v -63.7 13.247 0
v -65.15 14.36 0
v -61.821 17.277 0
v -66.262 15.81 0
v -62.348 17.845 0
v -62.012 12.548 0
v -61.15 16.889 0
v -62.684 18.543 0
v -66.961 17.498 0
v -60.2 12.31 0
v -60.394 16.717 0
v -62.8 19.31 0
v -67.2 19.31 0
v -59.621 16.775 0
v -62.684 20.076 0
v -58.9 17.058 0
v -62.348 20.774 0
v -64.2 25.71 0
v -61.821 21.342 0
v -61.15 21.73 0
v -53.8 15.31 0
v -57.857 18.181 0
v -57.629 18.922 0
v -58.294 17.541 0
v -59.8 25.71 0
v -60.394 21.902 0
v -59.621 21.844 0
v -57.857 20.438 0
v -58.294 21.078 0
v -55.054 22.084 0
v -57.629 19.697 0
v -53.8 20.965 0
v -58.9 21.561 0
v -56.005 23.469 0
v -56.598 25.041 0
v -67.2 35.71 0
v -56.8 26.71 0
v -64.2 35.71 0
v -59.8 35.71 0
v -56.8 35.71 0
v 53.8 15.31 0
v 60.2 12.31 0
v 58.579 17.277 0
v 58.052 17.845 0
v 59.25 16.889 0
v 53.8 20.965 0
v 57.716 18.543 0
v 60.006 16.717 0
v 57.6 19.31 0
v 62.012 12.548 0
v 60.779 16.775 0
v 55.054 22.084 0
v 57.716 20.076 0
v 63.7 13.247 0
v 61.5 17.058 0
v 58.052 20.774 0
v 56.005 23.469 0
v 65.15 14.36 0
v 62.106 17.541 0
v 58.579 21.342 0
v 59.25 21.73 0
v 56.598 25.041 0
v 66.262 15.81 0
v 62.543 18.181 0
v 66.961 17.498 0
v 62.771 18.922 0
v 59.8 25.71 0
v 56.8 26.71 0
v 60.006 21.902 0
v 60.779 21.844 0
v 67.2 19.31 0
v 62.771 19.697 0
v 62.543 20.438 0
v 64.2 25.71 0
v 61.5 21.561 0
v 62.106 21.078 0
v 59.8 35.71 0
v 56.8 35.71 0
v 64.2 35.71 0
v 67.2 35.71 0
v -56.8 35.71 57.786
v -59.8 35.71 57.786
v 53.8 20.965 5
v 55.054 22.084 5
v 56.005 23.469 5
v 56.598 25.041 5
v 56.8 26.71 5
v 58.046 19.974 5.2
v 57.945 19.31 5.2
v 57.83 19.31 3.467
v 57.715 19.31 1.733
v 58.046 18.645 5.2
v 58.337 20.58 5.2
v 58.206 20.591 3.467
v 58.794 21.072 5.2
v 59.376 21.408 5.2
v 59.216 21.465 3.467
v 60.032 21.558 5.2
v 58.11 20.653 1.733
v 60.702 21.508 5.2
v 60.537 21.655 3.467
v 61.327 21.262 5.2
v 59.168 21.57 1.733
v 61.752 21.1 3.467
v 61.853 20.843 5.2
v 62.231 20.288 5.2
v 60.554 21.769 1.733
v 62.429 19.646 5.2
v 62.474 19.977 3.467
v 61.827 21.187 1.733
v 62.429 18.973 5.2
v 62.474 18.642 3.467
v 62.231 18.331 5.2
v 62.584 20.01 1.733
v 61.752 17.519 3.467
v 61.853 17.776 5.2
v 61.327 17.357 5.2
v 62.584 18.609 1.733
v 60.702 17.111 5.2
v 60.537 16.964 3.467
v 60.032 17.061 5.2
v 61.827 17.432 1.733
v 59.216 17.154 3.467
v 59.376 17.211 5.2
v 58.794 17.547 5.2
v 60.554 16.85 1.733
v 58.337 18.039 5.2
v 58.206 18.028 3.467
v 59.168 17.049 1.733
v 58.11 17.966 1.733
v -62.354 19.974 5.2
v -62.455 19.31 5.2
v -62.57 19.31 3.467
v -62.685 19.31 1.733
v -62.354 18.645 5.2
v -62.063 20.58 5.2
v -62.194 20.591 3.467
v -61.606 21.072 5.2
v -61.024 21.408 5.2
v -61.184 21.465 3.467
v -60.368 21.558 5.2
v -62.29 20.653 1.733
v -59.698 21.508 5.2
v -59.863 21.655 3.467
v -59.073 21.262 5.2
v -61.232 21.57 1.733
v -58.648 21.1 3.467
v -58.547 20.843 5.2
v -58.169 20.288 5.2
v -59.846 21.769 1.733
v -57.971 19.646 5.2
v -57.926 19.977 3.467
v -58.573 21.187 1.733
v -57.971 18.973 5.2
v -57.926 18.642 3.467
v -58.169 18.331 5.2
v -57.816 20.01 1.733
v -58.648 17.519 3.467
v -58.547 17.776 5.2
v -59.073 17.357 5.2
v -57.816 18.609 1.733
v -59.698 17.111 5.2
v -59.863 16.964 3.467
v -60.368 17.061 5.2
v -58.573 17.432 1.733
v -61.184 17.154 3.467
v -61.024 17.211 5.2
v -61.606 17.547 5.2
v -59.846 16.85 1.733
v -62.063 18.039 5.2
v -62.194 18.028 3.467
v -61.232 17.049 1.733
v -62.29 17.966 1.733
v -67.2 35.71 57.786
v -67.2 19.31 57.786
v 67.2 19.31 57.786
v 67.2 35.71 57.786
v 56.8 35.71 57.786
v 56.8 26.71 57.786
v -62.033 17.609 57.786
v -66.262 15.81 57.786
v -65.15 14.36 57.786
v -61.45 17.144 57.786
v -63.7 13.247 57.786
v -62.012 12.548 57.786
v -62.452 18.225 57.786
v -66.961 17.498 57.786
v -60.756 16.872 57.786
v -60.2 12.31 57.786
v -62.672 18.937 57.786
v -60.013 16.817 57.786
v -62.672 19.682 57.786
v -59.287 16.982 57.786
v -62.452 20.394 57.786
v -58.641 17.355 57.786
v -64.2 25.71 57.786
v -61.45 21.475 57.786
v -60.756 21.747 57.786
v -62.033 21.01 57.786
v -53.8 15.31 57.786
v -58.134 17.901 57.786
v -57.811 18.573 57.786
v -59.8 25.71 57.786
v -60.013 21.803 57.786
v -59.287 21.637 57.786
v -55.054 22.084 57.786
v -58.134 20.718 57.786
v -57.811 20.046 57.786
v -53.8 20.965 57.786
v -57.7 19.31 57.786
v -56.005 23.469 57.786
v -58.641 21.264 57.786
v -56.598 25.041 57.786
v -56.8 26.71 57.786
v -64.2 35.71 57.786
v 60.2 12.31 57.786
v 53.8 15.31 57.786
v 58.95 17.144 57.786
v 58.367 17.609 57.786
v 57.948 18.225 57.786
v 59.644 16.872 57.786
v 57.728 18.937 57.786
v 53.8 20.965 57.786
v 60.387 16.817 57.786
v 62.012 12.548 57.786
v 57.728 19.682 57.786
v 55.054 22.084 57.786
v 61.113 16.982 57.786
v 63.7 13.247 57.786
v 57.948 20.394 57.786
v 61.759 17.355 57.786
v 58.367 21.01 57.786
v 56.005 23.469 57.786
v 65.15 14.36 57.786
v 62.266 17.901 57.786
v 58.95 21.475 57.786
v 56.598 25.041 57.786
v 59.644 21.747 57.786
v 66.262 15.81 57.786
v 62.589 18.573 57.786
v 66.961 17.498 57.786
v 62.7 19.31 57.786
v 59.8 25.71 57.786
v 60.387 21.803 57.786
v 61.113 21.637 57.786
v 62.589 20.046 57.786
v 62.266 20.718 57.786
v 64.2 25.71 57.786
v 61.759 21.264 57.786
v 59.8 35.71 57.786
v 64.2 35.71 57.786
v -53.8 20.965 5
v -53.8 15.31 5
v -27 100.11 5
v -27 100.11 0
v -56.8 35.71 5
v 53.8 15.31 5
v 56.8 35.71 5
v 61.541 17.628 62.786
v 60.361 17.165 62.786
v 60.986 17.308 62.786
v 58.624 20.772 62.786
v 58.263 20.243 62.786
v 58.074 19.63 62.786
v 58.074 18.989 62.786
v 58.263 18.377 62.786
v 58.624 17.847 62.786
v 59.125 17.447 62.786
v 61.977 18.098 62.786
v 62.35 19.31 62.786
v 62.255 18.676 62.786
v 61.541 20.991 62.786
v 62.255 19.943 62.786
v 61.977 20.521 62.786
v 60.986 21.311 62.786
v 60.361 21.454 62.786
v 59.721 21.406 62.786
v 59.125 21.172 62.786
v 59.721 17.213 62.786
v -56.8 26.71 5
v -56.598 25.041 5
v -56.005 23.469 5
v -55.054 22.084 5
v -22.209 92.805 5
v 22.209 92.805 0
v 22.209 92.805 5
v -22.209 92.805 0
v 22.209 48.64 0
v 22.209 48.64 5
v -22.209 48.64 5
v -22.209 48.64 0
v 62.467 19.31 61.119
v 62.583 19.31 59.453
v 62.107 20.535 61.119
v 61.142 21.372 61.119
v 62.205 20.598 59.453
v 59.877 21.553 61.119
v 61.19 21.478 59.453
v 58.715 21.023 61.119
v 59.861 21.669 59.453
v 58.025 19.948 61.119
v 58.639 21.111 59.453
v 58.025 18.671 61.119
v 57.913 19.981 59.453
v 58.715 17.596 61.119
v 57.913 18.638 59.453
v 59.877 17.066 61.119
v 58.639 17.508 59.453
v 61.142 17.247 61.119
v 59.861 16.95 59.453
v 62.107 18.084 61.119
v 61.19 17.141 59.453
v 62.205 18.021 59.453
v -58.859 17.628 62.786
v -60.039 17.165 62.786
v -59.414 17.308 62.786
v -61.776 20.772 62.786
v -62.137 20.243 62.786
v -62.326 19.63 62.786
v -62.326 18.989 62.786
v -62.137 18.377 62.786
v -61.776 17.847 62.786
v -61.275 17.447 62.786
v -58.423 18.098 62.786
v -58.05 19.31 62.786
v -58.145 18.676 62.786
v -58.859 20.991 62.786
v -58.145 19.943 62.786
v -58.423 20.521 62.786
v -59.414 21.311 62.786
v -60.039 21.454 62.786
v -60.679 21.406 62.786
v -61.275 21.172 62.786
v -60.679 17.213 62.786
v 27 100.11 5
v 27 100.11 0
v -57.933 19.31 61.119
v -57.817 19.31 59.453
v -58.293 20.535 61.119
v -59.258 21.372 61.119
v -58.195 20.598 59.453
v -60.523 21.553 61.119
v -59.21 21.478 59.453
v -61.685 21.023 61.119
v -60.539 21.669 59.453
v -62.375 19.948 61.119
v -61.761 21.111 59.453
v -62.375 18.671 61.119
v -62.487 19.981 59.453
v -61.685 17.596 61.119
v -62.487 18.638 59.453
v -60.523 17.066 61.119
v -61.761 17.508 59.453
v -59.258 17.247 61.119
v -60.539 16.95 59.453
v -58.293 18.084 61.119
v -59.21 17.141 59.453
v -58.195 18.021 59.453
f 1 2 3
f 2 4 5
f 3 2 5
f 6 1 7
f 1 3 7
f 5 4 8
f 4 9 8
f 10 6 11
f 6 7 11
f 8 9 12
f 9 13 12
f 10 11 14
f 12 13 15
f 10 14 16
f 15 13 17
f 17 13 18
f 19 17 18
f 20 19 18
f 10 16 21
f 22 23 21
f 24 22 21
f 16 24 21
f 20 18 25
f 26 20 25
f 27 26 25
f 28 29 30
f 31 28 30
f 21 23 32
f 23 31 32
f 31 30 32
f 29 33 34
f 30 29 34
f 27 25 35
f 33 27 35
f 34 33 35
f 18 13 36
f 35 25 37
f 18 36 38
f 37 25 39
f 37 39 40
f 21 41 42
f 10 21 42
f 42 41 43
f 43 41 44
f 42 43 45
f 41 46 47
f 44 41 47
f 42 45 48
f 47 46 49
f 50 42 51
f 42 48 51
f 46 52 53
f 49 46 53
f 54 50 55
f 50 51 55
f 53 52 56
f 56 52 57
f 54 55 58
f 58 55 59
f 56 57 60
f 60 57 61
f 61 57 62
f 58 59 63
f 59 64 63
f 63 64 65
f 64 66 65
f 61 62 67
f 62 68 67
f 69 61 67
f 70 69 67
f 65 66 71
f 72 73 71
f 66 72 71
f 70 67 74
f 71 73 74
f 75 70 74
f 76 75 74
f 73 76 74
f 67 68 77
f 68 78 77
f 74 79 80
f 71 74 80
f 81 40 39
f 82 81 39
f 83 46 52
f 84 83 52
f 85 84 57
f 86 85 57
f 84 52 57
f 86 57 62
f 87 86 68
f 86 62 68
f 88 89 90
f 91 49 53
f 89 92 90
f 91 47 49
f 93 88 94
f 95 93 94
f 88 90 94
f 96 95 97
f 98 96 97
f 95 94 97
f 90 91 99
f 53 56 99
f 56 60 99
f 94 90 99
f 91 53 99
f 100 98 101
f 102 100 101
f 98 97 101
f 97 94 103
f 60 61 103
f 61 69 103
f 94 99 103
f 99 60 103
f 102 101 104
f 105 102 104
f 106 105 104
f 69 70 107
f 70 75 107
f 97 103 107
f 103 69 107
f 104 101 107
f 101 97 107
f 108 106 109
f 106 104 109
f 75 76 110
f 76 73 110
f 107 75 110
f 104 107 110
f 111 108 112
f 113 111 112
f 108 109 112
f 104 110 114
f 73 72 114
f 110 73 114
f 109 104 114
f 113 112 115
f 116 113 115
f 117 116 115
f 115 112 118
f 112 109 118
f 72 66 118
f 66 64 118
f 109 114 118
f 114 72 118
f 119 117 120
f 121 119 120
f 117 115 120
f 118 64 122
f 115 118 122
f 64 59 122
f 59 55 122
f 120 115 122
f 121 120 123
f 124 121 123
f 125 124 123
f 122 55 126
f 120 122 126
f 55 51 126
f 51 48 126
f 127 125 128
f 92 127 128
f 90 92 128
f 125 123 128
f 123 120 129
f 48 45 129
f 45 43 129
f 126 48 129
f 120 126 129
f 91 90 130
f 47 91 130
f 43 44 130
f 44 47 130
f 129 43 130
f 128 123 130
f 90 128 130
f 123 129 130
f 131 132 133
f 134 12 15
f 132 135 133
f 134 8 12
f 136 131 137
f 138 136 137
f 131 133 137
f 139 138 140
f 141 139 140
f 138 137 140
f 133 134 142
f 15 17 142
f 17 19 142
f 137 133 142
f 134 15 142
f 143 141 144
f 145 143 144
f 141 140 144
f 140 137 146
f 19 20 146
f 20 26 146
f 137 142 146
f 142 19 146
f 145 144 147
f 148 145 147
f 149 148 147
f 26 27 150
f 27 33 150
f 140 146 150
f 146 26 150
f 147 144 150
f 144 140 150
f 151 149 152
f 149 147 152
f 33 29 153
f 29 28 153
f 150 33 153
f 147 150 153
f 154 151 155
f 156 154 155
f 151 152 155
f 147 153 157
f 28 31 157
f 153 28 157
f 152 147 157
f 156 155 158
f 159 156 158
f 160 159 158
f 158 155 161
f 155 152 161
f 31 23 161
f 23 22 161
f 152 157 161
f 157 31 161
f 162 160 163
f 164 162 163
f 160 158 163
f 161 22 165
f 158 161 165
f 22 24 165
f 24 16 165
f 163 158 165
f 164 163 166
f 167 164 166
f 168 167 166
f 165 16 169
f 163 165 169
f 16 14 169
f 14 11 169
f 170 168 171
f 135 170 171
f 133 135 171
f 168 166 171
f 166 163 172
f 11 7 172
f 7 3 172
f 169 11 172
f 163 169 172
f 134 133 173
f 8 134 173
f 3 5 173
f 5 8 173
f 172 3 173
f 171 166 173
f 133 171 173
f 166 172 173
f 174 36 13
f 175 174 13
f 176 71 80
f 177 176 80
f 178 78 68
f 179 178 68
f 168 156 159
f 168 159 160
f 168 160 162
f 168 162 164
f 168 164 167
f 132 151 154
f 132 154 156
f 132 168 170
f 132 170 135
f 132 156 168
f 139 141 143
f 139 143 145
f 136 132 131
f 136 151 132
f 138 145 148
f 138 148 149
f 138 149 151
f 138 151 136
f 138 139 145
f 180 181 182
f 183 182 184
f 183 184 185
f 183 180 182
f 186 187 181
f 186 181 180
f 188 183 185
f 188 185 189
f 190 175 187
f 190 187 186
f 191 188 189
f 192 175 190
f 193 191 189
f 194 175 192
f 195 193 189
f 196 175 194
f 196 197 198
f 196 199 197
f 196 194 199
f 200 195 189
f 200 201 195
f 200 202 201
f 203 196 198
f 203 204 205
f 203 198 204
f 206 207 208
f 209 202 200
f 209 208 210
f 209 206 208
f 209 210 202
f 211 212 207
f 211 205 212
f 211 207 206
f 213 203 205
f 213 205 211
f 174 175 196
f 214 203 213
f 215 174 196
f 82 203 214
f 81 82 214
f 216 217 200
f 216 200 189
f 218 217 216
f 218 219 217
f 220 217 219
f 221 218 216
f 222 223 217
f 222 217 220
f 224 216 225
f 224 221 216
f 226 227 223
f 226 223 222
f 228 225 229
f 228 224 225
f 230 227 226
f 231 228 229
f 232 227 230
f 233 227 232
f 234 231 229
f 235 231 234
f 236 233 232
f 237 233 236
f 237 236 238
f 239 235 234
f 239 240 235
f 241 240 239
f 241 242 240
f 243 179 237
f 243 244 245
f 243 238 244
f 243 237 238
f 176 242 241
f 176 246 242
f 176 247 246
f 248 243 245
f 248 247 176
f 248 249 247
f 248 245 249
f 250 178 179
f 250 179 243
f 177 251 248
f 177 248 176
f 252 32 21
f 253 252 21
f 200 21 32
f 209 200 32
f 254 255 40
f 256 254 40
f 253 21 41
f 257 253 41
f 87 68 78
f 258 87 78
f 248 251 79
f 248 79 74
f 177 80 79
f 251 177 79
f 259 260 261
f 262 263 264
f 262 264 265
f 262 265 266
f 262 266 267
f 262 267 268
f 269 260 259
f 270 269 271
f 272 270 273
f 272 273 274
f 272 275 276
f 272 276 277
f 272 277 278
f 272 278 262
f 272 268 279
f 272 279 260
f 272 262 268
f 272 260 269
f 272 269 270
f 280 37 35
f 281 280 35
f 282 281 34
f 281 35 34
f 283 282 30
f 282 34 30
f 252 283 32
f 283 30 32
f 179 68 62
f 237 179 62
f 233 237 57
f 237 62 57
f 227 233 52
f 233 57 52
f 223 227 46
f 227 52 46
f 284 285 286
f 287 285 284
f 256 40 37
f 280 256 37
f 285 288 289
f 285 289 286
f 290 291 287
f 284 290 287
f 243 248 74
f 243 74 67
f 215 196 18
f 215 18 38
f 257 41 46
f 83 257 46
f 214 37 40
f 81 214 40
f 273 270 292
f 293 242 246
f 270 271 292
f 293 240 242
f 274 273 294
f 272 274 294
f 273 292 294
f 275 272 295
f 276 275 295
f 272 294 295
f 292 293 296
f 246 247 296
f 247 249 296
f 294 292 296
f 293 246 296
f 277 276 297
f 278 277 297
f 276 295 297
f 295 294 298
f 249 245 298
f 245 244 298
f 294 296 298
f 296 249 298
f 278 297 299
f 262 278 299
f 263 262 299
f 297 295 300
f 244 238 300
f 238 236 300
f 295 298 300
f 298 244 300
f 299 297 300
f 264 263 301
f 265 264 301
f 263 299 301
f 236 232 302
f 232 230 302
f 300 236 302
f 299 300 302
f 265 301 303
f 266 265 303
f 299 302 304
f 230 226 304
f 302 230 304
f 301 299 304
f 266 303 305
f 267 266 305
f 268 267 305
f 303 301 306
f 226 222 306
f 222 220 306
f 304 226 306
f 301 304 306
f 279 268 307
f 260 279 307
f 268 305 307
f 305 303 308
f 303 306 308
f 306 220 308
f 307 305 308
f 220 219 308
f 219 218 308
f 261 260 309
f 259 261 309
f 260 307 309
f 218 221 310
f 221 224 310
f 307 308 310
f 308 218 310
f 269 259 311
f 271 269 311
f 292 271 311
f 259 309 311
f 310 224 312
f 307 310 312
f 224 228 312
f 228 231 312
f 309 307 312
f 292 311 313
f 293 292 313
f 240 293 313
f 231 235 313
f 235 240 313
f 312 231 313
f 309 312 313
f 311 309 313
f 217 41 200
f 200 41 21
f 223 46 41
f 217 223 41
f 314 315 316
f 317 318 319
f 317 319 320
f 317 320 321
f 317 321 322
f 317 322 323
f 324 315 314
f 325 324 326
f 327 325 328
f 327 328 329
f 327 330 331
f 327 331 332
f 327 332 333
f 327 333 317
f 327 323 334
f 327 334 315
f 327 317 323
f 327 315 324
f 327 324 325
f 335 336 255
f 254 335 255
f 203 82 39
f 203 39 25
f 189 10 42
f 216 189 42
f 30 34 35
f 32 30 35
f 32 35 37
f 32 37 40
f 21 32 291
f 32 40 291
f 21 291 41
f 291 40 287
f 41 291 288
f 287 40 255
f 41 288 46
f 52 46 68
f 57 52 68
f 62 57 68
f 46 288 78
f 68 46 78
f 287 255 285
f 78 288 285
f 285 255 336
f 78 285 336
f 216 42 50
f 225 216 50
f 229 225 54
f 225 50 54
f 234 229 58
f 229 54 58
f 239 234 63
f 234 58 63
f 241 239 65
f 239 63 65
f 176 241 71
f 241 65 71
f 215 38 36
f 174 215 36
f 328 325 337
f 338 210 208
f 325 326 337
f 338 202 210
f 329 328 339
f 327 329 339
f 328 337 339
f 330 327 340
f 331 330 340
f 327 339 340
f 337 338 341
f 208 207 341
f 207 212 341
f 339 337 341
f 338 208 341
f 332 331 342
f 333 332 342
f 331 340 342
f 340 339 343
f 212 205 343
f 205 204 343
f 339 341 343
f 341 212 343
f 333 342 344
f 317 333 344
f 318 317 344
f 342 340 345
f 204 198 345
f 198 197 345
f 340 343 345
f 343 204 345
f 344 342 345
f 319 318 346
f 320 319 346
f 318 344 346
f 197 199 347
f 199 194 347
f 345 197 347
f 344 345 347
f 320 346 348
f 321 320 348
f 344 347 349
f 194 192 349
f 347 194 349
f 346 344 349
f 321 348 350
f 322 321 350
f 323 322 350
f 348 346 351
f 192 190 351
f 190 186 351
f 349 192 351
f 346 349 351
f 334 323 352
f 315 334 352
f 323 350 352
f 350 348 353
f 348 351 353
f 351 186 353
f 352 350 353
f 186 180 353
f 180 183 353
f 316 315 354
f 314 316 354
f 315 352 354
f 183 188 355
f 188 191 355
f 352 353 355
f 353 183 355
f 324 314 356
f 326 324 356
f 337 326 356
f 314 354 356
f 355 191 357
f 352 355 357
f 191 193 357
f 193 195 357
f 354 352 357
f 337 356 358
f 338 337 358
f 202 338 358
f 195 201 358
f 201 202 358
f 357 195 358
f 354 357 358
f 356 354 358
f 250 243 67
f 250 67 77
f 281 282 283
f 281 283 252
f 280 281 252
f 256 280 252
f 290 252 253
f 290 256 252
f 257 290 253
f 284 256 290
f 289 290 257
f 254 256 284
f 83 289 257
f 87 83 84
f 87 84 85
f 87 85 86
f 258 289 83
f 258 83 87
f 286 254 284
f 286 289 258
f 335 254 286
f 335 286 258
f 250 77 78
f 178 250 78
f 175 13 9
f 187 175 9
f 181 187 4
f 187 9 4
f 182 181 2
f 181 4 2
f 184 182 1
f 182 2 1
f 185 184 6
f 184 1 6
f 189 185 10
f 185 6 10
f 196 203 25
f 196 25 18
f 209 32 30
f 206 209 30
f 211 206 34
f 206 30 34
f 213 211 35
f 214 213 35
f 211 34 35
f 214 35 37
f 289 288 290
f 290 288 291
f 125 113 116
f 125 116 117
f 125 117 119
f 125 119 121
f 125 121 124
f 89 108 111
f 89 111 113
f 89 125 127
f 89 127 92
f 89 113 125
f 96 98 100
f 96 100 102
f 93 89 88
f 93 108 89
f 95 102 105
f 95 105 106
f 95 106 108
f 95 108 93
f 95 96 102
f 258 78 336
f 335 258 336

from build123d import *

# Parameters (mm, degrees)
EXTRUDE2_DEPTH               = 57.786
SKETCH2_R                    = 2.5
EXTRUDE3_DEPTH               = 5
EXTRUDE3_DRAFT               = 4
EXTRUDE3_PROFILE_2_DEPTH     = 5
EXTRUDE3_PROFILE_2_DRAFT     = 4
SKETCH4_R                    = 2.6
CUT_EXTRUDE1_DEPTH           = 5.2
CUT_EXTRUDE1_DRAFT           = -3.8
CUT_EXTRUDE1_PROFILE_2_DEPTH = 5.2
CUT_EXTRUDE1_PROFILE_2_DRAFT = -3.8
SKETCH3_W                    = 44.4182
SKETCH3_H                    = 44.1642
EXTRUDE4_DEPTH               = 5


with BuildPart() as part:
    # Sketch1 → Extrude2 (new body)
    with BuildSketch(Plane.XY):
        with BuildLine():
            Line((-60.2, 12.309521667), (60.2, 12.309521667))
            ThreePointArc((60.2, 12.309521667), (65.149747468, 14.359774199), (67.2, 19.309521667))
            Line((67.2, 19.309521667), (67.2, 35.709521667))
            Line((67.2, 35.709521667), (64.2, 35.709521667))
            Line((64.2, 35.709521667), (64.2, 25.709521667))
            Line((64.2, 25.709521667), (59.8, 25.709521667))
            Line((59.8, 25.709521667), (59.8, 35.709521667))
            Line((59.8, 35.709521667), (56.8, 35.709521667))
            Line((56.8, 35.709521667), (56.8, 26.709521667))
            ThreePointArc((56.8, 26.709521667), (56.004836823, 23.469151318), (53.8, 20.964959021))
            Line((53.8, 20.964959021), (53.8, 15.309521667))
            Line((53.8, 15.309521667), (-53.8, 15.309521667))
            Line((-53.8, 15.309521667), (-53.8, 20.964959021))
            ThreePointArc((-53.8, 20.964959021), (-56.004836823, 23.469151318), (-56.8, 26.709521667))
            Line((-56.8, 26.709521667), (-56.8, 35.709521667))
            Line((-56.8, 35.709521667), (-59.8, 35.709521667))
            Line((-59.8, 35.709521667), (-59.8, 25.709521667))
            Line((-59.8, 25.709521667), (-64.2, 25.709521667))
            Line((-64.2, 25.709521667), (-64.2, 35.709521667))
            Line((-64.2, 35.709521667), (-67.2, 35.709521667))
            Line((-67.2, 35.709521667), (-67.2, 19.309521667))
            ThreePointArc((-67.2, 19.309521667), (-65.149747468, 14.359774199), (-60.2, 12.309521667))
        make_face()
    extrude(amount=EXTRUDE2_DEPTH)


with BuildPart() as extrude3_tool:
    # Sketch2 → Extrude3 (with draft: the straight prism first)
    with BuildSketch(Plane.XY.offset(57.786)):
        with Locations((-60.2, 19.309521667)):
            Circle(SKETCH2_R)
    extrude(amount=EXTRUDE3_DEPTH)
    # Extrude3: the draft: its side faces are tilted about the plane it starts from
    extrude3_sides = [extrude3_tool.faces().sort_by_distance(p)[0] for p in [
        (-62.7, 19.309521667, 60.286),
    ]]
    draft(extrude3_sides, Plane.XY.offset(57.786), EXTRUDE3_DRAFT)


with BuildPart() as part_1:
    add(part.part)

    # Extrude3: add extrude3_tool
    add(extrude3_tool.part)


with BuildPart() as extrude3_profile_2_tool:
    # Sketch2 → Extrude3 profile 2 (with draft: the straight prism first)
    with BuildSketch(Plane.XY.offset(57.786)):
        with Locations((60.2, 19.309521667)):
            Circle(SKETCH2_R)
    extrude(amount=EXTRUDE3_PROFILE_2_DEPTH)
    # Extrude3 profile 2: the draft: its side faces are tilted about the plane it starts from
    extrude3_profile_2_sides = [extrude3_profile_2_tool.faces().sort_by_distance(p)[0] for p in [
        (57.7, 19.309521667, 60.286),
    ]]
    draft(extrude3_profile_2_sides, Plane.XY.offset(57.786), EXTRUDE3_PROFILE_2_DRAFT)


with BuildPart() as part_2:
    add(part_1.part)

    # Extrude3 profile 2: add extrude3_profile_2_tool
    add(extrude3_profile_2_tool.part)


with BuildPart() as cut_extrude1_tool:
    # Sketch4 → Cut-Extrude1 (with draft: the straight prism first)
    with BuildSketch(Plane(origin=(0, 0, 0), x_dir=(-1, 0, 0), z_dir=(0, 0, -1))):
        with Locations((-60.2, 19.309521667)):
            Circle(SKETCH4_R)
    extrude(amount=-CUT_EXTRUDE1_DEPTH)
    # Cut-Extrude1: the draft: its side faces are tilted about the plane it starts from
    cut_extrude1_sides = [cut_extrude1_tool.faces().sort_by_distance(p)[0] for p in [
        (62.8, 19.309521667, 2.6),
    ]]
    draft(cut_extrude1_sides, Plane(origin=(0, 0, 0), x_dir=(-1, 0, 0), z_dir=(0, 0, -1)), CUT_EXTRUDE1_DRAFT)


with BuildPart() as part_3:
    add(part_2.part)

    # Cut-Extrude1: cut by cut_extrude1_tool
    add(cut_extrude1_tool.part, mode=Mode.SUBTRACT)


with BuildPart() as cut_extrude1_profile_2_tool:
    # Sketch4 → Cut-Extrude1 profile 2 (with draft: the straight prism first)
    with BuildSketch(Plane(origin=(0, 0, 0), x_dir=(-1, 0, 0), z_dir=(0, 0, -1))):
        with Locations((60.2, 19.309521667)):
            Circle(SKETCH4_R)
    extrude(amount=-CUT_EXTRUDE1_PROFILE_2_DEPTH)
    # Cut-Extrude1 profile 2: the draft: its side faces are tilted about the plane it starts from
    cut_extrude1_profile_2_sides = [cut_extrude1_profile_2_tool.faces().sort_by_distance(p)[0] for p in [
        (-57.6, 19.309521667, 2.6),
    ]]
    draft(cut_extrude1_profile_2_sides, Plane(origin=(0, 0, 0), x_dir=(-1, 0, 0), z_dir=(0, 0, -1)), CUT_EXTRUDE1_PROFILE_2_DRAFT)


with BuildPart() as part_4:
    add(part_3.part)

    # Cut-Extrude1 profile 2: cut by cut_extrude1_profile_2_tool
    add(cut_extrude1_profile_2_tool.part, mode=Mode.SUBTRACT)


with BuildPart() as body_2:
    # Sketch3 → Extrude4 (new body)
    with BuildSketch(Plane(origin=(0, 0, 0), x_dir=(-1, 0, 0), z_dir=(0, 0, -1))):
        with BuildLine():
            Line((-27, 100.109521667), (27, 100.109521667))
            Line((27, 100.109521667), (56.8, 35.709521667))
            Line((56.8, 35.709521667), (56.8, 26.709521667))
            ThreePointArc((56.8, 26.709521667), (56.004836823, 23.469151318), (53.8, 20.964959021))
            Line((53.8, 20.964959021), (53.8, 15.309521667))
            Line((53.8, 15.309521667), (-53.8, 15.309521667))
            Line((-53.8, 15.309521667), (-53.8, 20.964959021))
            ThreePointArc((-53.8, 20.964959021), (-56.004836823, 23.469151318), (-56.8, 26.709521667))
            Line((-56.8, 26.709521667), (-56.8, 35.709521667))
            Line((-56.8, 35.709521667), (-27, 100.109521667))
        make_face()
        with Locations((0, 70.722421667)):
            Rectangle(SKETCH3_W, SKETCH3_H, mode=Mode.SUBTRACT)
    extrude(amount=-EXTRUDE4_DEPTH)


solid = Compound([part_4.part, body_2.part])
